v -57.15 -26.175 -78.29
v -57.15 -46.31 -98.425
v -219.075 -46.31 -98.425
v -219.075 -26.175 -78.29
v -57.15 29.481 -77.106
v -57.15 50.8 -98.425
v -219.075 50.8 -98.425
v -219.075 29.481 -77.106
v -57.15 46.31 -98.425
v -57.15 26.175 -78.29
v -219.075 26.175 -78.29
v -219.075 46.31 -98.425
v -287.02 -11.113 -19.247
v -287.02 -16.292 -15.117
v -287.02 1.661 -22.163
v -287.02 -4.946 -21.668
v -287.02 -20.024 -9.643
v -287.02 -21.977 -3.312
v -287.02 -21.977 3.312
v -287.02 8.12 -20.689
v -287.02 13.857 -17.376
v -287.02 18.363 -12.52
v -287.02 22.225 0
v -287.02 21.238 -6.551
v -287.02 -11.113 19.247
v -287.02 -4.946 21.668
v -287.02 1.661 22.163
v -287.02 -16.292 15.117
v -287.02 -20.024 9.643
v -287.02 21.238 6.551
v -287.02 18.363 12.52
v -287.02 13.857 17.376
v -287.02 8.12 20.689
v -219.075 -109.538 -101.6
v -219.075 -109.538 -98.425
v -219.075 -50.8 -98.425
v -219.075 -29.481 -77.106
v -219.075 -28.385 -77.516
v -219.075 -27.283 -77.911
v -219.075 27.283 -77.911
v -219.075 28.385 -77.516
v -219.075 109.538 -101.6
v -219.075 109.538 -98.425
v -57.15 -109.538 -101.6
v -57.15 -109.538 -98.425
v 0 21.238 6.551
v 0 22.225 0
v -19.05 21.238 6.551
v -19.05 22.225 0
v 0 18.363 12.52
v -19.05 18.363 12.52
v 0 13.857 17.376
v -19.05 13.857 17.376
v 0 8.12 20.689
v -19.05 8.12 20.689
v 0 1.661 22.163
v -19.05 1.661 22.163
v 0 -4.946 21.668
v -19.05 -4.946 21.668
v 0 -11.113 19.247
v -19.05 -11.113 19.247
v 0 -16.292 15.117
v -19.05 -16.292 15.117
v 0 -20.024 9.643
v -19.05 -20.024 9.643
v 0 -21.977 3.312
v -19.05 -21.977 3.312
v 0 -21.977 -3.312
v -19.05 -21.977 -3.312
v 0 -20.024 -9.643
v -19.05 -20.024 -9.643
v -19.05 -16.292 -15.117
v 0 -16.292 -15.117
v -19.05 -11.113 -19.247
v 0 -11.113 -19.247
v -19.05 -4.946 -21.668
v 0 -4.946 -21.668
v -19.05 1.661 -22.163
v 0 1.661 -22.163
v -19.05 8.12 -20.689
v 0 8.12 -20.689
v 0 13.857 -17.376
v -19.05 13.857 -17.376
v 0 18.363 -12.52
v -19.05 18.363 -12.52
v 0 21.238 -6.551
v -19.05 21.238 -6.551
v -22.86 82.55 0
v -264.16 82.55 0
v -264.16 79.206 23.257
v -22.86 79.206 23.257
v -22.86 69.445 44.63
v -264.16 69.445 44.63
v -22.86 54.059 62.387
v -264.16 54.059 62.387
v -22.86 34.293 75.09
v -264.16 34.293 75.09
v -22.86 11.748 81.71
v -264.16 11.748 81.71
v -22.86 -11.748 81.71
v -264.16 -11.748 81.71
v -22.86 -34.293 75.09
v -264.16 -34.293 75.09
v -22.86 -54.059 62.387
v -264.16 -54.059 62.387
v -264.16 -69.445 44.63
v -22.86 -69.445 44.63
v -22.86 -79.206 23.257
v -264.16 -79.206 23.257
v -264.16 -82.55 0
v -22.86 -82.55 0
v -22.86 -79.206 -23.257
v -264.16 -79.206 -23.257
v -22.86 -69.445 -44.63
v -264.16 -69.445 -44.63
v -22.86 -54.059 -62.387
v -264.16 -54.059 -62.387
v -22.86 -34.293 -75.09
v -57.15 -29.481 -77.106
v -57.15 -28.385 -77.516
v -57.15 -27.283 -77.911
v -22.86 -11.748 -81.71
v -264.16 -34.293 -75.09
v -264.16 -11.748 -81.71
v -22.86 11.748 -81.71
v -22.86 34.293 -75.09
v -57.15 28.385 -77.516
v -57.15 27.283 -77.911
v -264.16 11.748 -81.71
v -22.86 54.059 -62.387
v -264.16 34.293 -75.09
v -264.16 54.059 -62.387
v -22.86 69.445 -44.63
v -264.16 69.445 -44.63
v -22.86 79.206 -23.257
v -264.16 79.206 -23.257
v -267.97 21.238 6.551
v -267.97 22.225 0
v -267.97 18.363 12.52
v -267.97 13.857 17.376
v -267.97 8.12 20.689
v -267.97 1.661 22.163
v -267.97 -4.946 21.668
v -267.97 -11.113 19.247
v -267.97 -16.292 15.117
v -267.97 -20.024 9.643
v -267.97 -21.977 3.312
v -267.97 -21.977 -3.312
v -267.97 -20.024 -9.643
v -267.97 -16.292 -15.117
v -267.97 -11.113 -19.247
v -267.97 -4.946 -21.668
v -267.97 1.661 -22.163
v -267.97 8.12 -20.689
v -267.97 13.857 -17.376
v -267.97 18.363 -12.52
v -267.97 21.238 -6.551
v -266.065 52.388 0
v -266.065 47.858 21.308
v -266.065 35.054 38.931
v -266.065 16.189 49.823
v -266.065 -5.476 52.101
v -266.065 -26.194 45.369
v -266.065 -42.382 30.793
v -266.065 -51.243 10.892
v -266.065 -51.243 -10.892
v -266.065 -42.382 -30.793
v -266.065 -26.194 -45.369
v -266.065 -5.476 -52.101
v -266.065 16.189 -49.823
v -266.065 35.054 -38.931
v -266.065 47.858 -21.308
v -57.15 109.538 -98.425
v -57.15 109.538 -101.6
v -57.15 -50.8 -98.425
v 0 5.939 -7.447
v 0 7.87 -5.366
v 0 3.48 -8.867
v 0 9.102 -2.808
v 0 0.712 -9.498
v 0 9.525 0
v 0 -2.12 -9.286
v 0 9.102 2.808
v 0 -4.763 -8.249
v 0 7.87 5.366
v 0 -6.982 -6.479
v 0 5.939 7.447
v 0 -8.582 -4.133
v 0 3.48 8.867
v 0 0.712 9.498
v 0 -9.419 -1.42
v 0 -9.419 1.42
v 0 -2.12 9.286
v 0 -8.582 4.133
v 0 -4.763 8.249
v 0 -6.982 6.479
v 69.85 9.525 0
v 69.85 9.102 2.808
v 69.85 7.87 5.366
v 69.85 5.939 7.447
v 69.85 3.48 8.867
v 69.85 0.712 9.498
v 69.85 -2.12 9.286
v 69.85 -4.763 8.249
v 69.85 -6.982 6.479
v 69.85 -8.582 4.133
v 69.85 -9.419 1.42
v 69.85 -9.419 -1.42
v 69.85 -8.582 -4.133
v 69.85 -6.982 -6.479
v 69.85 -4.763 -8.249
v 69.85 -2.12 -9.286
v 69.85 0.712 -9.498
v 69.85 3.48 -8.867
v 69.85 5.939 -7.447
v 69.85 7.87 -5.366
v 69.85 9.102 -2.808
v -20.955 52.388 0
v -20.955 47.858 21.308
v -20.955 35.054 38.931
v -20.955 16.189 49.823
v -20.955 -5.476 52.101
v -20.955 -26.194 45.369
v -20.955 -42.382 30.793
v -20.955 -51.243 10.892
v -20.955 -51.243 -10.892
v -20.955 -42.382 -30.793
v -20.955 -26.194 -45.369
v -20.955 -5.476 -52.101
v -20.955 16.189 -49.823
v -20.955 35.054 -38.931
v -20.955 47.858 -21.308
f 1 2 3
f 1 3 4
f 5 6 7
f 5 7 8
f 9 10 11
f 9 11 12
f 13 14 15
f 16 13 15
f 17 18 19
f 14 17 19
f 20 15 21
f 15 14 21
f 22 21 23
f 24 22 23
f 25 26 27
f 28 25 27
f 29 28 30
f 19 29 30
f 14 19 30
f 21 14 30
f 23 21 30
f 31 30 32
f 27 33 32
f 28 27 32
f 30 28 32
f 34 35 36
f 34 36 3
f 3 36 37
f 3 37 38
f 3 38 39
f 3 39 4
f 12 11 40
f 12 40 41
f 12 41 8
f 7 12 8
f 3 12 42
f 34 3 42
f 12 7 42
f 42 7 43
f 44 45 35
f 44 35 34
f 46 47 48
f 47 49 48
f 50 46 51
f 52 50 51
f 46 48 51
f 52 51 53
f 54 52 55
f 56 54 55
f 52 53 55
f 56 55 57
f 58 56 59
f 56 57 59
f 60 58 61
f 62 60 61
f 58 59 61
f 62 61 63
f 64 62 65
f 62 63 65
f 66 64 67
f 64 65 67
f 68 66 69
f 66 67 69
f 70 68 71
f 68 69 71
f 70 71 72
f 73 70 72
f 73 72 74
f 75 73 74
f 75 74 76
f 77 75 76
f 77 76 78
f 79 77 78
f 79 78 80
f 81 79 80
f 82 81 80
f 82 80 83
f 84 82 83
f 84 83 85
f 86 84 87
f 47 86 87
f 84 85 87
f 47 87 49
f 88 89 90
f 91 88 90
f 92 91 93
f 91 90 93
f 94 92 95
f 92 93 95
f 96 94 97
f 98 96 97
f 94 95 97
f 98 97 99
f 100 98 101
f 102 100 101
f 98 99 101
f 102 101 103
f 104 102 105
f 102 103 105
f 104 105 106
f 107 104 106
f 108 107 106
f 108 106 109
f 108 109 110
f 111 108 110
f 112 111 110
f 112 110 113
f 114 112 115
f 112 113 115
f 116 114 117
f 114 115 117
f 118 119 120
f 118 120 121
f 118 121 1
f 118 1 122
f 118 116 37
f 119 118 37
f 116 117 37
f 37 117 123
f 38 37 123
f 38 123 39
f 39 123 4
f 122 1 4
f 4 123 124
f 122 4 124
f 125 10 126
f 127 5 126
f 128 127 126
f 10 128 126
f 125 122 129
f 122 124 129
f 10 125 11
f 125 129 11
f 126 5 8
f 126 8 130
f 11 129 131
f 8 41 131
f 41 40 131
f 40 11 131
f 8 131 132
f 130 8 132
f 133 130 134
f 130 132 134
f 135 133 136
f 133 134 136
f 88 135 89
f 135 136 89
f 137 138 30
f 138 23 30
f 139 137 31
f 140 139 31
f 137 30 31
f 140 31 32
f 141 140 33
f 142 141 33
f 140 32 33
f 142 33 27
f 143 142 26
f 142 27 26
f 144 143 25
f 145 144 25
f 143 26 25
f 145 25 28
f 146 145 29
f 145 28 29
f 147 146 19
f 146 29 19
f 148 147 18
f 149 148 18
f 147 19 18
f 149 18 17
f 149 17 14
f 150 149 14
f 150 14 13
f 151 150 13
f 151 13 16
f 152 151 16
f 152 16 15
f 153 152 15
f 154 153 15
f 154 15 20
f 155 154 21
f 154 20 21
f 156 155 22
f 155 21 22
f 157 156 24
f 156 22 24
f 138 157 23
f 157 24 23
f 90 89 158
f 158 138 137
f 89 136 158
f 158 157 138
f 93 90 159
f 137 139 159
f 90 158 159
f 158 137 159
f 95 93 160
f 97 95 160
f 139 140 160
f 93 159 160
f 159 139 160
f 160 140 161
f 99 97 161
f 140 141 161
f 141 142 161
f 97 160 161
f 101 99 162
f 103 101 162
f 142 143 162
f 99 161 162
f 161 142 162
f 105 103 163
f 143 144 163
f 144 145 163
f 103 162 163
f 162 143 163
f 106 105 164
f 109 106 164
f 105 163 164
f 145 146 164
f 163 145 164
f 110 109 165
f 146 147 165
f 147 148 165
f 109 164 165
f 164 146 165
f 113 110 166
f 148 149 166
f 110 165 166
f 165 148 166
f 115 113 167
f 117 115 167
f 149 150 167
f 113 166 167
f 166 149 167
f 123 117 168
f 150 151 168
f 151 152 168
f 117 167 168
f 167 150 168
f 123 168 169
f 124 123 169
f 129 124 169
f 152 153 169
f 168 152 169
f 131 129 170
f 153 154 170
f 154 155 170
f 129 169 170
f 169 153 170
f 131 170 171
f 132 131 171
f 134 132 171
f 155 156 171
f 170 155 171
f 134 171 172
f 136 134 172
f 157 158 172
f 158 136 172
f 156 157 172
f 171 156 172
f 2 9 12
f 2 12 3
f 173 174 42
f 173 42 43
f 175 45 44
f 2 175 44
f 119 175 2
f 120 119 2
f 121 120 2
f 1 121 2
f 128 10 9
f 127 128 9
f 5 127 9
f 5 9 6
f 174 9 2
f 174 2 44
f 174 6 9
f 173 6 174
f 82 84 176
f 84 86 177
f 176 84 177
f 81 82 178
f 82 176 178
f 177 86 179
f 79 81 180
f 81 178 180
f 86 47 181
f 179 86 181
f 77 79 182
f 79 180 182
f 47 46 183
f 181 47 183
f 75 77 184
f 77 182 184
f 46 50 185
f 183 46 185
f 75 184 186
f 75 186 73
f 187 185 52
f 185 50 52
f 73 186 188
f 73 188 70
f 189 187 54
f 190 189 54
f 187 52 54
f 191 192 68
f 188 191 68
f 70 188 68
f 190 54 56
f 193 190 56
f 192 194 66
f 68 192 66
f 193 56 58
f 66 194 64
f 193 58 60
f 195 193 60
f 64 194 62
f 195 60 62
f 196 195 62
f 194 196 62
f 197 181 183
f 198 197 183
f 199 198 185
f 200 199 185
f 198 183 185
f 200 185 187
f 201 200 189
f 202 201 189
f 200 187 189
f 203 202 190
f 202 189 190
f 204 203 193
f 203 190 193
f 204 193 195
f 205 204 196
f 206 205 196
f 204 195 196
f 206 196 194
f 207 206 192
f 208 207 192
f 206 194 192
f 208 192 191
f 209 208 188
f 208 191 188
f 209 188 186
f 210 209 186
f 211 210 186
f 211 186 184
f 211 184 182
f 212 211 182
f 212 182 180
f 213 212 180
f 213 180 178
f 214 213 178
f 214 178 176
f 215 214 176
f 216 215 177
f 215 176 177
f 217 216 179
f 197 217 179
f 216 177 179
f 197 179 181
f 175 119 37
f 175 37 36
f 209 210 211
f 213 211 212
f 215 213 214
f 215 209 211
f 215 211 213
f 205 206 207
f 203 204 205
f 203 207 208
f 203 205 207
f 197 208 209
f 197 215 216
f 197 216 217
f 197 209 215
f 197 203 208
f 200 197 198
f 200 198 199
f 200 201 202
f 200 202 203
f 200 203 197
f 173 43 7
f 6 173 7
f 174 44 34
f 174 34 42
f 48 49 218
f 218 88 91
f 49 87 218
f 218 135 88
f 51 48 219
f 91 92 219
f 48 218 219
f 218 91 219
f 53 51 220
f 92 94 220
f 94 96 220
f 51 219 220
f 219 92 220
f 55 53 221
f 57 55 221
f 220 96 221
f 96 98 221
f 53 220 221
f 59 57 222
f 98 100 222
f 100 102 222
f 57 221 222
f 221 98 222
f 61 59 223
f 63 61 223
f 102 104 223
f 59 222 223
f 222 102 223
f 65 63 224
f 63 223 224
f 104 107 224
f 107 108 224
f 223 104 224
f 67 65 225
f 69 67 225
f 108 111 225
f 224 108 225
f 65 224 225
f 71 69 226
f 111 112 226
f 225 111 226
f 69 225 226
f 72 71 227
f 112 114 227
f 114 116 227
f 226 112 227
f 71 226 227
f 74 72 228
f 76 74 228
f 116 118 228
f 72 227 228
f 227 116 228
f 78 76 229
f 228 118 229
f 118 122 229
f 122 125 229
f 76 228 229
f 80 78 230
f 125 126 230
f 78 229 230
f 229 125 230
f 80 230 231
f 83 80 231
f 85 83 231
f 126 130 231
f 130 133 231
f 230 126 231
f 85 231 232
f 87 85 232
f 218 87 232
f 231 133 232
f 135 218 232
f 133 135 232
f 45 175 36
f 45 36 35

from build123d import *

# Parameters (mm, degrees)
F2_R     = 9.525
F3_DEPTH = 69.85
F6_DEPTH = 161.925


with BuildPart() as f1:
    # F0 (on Top) → F1 (revolve)
    with BuildSketch(Plane.XY):
        Polygon((-287.02, 0), (0, 0), (0, 22.225), (-19.05, 22.225), (-22.86, 82.55), (-264.16, 82.55), (-267.97, 22.225), (-287.02, 22.225), align=None)
    revolve(axis=Axis((-143.51, 0, 0), (1, 0, 0)))

    # F2 (on face) → F3 (join)
    with BuildSketch(Plane.YZ):
        Circle(F2_R)
    extrude(amount=F3_DEPTH)

    # F5 (on offset) → F6 (join)
    with BuildSketch(Plane.YZ.offset(-57.15)):
        Polygon((-50.8, -98.425), (-109.5375, -98.425), (-109.5375, -101.6), (109.5375, -101.6), (109.5375, -98.425), (50.8, -98.425), (14.878976, -62.503976), (12.633911, -64.74904), (46.309872, -98.425), (-46.309872, -98.425), (-12.633911, -64.74904), (-14.878976, -62.503976), align=None)
    extrude(amount=-F6_DEPTH)


solid = f1.part
